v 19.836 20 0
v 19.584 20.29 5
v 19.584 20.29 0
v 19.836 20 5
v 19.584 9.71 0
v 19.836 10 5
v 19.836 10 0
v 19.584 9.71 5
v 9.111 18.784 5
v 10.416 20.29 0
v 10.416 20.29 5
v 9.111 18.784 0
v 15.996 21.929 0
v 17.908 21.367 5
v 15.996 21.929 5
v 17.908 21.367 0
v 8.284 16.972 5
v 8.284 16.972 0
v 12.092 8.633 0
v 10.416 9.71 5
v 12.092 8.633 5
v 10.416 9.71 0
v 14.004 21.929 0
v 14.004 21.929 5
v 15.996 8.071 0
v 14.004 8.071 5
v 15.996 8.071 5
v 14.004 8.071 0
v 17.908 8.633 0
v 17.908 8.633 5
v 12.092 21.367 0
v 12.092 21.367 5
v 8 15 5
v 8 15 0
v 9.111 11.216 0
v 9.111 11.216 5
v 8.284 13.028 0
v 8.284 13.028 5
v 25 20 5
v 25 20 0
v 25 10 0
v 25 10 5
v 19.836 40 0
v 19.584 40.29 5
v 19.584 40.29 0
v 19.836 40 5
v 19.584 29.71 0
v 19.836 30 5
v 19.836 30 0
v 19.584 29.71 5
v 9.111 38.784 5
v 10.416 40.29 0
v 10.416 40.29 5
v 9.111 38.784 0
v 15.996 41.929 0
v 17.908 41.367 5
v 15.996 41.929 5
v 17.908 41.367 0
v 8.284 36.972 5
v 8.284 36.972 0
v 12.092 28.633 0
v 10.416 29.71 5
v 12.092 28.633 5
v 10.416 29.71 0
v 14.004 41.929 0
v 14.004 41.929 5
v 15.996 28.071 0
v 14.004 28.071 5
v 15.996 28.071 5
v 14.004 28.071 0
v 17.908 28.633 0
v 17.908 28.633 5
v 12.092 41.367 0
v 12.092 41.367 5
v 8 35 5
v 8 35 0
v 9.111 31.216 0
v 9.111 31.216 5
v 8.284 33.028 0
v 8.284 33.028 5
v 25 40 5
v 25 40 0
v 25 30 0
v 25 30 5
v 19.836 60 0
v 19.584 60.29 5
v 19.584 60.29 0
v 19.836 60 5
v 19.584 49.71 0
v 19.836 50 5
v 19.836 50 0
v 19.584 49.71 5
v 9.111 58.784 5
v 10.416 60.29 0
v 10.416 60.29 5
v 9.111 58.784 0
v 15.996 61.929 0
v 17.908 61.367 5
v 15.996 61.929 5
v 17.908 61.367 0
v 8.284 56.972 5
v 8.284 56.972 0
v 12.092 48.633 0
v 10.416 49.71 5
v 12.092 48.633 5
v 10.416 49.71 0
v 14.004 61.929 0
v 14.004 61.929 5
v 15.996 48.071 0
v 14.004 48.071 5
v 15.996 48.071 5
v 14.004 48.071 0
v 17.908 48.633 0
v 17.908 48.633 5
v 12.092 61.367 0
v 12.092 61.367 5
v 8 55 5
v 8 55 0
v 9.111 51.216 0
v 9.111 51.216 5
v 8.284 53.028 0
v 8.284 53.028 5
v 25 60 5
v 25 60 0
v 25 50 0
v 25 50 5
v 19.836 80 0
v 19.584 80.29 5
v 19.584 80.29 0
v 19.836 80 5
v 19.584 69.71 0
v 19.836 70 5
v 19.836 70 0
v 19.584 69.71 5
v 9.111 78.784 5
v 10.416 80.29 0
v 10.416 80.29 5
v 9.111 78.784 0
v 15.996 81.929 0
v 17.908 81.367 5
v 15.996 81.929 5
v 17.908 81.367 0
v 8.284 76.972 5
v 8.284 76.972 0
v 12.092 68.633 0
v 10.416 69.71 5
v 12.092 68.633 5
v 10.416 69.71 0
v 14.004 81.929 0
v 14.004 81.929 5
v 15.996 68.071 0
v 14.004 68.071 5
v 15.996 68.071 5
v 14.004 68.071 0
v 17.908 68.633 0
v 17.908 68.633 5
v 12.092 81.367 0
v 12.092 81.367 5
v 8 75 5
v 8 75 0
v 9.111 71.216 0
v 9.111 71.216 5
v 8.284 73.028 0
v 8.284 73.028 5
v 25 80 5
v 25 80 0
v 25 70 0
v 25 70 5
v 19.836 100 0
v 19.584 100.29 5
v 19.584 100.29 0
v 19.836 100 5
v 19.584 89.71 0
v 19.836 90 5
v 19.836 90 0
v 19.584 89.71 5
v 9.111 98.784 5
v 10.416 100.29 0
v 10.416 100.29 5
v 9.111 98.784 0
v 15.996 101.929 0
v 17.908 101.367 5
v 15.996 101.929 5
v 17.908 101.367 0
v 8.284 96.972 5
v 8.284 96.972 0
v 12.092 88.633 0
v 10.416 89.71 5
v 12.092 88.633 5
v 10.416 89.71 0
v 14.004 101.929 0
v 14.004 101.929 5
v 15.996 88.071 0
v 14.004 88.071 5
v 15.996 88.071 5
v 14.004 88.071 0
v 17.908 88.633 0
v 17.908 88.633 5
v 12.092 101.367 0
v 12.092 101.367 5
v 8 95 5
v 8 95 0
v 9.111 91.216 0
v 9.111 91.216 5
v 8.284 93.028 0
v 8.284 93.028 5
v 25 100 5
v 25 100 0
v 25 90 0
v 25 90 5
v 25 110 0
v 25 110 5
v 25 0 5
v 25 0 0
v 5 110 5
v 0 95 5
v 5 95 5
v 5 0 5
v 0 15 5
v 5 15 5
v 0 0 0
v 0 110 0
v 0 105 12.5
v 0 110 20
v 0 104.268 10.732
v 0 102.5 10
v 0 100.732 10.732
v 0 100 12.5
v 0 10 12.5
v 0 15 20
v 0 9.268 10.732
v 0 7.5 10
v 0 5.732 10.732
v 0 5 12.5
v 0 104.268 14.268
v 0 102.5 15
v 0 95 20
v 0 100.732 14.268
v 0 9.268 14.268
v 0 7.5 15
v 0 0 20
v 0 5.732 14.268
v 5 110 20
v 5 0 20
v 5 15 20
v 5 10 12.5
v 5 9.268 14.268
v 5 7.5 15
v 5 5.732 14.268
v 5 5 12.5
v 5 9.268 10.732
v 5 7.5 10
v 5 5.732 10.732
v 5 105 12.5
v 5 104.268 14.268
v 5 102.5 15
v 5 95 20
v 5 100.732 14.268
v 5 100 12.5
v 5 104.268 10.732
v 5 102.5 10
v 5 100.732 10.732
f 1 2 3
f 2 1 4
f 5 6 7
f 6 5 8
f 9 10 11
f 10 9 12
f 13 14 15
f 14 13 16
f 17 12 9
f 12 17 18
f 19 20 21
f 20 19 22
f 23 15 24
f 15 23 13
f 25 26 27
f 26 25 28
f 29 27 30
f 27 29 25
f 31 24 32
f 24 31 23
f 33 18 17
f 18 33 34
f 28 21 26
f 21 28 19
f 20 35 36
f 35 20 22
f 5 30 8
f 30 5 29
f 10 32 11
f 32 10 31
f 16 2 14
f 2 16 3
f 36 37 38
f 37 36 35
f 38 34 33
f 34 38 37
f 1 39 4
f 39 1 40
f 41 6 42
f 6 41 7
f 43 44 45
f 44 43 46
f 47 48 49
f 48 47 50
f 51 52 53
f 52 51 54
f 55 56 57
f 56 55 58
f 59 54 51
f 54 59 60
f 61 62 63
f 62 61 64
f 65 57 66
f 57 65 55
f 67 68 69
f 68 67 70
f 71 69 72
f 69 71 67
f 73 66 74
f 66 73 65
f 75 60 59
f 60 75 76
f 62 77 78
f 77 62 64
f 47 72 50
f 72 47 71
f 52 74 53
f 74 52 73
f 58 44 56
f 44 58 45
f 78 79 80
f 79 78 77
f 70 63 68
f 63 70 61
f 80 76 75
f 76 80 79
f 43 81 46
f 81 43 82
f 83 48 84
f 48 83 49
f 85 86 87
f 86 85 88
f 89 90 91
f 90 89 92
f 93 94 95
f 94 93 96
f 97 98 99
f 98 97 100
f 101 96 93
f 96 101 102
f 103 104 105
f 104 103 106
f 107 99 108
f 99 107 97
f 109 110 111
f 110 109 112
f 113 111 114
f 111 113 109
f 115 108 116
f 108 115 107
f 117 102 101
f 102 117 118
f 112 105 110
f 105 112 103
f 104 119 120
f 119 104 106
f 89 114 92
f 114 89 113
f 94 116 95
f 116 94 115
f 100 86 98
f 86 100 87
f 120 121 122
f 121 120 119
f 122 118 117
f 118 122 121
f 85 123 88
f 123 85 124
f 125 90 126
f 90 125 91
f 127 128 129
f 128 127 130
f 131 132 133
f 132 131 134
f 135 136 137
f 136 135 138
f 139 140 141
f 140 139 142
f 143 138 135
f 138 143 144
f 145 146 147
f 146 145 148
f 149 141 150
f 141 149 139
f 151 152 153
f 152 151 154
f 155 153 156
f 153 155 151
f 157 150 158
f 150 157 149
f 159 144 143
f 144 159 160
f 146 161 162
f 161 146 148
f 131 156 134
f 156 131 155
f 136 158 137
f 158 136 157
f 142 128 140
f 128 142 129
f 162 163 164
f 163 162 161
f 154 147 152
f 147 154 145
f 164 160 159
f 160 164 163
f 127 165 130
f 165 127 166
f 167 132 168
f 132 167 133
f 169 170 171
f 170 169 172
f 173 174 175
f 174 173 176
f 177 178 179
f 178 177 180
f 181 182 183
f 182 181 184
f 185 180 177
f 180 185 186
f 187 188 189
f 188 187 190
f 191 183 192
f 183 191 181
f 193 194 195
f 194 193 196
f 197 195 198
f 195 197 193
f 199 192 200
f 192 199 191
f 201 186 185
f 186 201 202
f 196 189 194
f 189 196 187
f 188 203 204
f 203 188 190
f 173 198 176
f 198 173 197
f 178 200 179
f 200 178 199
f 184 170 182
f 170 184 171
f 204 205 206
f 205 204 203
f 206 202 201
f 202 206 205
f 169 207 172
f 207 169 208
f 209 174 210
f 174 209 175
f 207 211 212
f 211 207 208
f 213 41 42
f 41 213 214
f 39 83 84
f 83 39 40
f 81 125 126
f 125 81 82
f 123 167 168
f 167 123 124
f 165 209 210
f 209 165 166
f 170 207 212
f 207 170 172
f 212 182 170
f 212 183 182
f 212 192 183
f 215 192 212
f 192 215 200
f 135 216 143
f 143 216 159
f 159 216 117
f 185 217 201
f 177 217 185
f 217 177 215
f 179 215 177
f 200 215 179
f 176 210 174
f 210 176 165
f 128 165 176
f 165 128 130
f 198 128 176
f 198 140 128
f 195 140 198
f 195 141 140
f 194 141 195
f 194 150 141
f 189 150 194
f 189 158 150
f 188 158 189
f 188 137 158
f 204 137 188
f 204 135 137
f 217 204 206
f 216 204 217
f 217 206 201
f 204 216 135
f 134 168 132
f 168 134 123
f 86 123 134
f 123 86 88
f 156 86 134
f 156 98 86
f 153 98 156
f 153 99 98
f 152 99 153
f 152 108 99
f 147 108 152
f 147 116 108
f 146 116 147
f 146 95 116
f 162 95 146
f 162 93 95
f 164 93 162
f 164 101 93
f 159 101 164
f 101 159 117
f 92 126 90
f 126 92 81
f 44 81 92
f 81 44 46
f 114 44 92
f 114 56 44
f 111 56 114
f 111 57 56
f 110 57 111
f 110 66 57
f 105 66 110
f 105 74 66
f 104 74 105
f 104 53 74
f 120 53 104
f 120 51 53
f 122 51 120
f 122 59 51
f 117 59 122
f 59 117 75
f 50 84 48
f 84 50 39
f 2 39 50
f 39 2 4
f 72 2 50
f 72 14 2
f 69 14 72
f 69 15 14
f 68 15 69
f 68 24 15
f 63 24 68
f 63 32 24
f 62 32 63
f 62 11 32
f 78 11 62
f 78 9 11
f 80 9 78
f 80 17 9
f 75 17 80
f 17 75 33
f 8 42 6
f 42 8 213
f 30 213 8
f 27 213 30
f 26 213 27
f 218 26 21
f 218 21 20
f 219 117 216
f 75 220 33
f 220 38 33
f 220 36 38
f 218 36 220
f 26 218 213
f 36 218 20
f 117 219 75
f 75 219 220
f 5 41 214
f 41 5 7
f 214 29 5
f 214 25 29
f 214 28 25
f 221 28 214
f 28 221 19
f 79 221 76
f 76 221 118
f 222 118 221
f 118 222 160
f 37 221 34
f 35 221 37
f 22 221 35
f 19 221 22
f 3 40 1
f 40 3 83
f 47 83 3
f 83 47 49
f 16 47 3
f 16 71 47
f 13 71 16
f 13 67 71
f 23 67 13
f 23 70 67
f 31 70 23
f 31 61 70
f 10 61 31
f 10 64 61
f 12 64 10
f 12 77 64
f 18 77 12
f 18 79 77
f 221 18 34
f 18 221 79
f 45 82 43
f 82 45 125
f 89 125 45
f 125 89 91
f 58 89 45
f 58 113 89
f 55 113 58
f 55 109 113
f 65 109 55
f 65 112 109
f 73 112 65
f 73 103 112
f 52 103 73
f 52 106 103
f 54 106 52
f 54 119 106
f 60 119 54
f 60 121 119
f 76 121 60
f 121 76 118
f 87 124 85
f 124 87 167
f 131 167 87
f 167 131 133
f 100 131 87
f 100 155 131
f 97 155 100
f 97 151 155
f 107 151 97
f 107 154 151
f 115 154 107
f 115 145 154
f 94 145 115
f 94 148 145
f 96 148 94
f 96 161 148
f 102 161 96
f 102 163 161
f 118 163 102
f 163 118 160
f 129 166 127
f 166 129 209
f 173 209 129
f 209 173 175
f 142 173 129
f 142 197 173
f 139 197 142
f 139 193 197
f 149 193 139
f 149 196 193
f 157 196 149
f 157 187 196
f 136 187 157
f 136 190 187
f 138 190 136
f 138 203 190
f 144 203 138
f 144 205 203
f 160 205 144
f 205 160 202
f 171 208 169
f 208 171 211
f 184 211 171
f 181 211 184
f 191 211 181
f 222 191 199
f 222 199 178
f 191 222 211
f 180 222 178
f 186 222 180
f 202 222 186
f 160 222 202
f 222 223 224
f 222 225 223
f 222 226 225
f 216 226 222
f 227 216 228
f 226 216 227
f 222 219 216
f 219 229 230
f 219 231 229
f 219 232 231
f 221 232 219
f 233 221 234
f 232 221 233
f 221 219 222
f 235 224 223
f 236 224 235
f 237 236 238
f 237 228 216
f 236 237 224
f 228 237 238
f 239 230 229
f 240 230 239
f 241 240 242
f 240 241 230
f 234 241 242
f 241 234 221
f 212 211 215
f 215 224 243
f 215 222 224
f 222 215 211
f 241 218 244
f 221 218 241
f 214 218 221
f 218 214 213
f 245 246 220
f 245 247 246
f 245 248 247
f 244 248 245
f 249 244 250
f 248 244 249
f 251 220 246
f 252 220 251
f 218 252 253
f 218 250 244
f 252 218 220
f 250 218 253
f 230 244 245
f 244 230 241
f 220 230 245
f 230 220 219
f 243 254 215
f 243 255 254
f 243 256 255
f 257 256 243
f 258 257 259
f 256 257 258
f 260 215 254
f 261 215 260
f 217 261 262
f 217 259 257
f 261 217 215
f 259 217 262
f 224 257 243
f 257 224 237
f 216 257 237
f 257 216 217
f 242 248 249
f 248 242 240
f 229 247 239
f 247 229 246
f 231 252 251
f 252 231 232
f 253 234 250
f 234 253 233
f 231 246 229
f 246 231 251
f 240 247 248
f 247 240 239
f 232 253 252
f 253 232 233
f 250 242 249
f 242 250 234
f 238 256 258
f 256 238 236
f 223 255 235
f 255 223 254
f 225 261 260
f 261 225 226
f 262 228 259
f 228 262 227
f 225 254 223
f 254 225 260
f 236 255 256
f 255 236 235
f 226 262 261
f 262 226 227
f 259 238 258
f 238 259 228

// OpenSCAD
//Enter # of wires you wanna hang (at least 3)
NumberOfCables = 5; // [3:20]
cable_d = 10; // [5:Small(5mm),10:Medium(10mm),15:Large(15mm)]
//Enter hanger thickness
plate_h = 5; // [5,6,7,8,9,10,11,12,13,14,15]
//Clearance between slots, slots and wall
c = 10; // [10:20]
plate_l = cable_d+(1.5*c); //Hanger length
plate_w = (NumberOfCables*(cable_d+c)) + c; //Hanger width
difference()
{
    union()
    {
        translate([0, 0, plate_h]) cube([plate_h, 15, 15]);
        translate([0, plate_w-15, plate_h]) cube([plate_h, 15, 15]);
        difference()
        {
            cube([plate_l, plate_w, plate_h], center=[plate_l/2, plate_w/2, plate_h/2]);
            for(i = [1:NumberOfCables])
            {
                translate([(c+(cable_d/2)), (i*(c+(cable_d))-(cable_d/2)), plate_h/2]) cylinder(plate_h+0.2, cable_d/2+2, cable_d/2+2, center = true);
                translate([plate_l-cable_d/2, (i*(c+(cable_d))-(cable_d/2)), plate_h/2]) cube([cable_d+0.1, cable_d, plate_h+0.2], center = true);
            }
        }
    }
translate([plate_h/2, 7.5, plate_h+7.5]) rotate([0, 90, 0]) cylinder(plate_h+0.2, 2.5, 2.5, center = true);
translate([plate_h/2, plate_w-7.5, plate_h+7.5]) rotate([0, 90, 0]) cylinder(plate_h+0.2, 2.5, 2.5, center = true);    
}
